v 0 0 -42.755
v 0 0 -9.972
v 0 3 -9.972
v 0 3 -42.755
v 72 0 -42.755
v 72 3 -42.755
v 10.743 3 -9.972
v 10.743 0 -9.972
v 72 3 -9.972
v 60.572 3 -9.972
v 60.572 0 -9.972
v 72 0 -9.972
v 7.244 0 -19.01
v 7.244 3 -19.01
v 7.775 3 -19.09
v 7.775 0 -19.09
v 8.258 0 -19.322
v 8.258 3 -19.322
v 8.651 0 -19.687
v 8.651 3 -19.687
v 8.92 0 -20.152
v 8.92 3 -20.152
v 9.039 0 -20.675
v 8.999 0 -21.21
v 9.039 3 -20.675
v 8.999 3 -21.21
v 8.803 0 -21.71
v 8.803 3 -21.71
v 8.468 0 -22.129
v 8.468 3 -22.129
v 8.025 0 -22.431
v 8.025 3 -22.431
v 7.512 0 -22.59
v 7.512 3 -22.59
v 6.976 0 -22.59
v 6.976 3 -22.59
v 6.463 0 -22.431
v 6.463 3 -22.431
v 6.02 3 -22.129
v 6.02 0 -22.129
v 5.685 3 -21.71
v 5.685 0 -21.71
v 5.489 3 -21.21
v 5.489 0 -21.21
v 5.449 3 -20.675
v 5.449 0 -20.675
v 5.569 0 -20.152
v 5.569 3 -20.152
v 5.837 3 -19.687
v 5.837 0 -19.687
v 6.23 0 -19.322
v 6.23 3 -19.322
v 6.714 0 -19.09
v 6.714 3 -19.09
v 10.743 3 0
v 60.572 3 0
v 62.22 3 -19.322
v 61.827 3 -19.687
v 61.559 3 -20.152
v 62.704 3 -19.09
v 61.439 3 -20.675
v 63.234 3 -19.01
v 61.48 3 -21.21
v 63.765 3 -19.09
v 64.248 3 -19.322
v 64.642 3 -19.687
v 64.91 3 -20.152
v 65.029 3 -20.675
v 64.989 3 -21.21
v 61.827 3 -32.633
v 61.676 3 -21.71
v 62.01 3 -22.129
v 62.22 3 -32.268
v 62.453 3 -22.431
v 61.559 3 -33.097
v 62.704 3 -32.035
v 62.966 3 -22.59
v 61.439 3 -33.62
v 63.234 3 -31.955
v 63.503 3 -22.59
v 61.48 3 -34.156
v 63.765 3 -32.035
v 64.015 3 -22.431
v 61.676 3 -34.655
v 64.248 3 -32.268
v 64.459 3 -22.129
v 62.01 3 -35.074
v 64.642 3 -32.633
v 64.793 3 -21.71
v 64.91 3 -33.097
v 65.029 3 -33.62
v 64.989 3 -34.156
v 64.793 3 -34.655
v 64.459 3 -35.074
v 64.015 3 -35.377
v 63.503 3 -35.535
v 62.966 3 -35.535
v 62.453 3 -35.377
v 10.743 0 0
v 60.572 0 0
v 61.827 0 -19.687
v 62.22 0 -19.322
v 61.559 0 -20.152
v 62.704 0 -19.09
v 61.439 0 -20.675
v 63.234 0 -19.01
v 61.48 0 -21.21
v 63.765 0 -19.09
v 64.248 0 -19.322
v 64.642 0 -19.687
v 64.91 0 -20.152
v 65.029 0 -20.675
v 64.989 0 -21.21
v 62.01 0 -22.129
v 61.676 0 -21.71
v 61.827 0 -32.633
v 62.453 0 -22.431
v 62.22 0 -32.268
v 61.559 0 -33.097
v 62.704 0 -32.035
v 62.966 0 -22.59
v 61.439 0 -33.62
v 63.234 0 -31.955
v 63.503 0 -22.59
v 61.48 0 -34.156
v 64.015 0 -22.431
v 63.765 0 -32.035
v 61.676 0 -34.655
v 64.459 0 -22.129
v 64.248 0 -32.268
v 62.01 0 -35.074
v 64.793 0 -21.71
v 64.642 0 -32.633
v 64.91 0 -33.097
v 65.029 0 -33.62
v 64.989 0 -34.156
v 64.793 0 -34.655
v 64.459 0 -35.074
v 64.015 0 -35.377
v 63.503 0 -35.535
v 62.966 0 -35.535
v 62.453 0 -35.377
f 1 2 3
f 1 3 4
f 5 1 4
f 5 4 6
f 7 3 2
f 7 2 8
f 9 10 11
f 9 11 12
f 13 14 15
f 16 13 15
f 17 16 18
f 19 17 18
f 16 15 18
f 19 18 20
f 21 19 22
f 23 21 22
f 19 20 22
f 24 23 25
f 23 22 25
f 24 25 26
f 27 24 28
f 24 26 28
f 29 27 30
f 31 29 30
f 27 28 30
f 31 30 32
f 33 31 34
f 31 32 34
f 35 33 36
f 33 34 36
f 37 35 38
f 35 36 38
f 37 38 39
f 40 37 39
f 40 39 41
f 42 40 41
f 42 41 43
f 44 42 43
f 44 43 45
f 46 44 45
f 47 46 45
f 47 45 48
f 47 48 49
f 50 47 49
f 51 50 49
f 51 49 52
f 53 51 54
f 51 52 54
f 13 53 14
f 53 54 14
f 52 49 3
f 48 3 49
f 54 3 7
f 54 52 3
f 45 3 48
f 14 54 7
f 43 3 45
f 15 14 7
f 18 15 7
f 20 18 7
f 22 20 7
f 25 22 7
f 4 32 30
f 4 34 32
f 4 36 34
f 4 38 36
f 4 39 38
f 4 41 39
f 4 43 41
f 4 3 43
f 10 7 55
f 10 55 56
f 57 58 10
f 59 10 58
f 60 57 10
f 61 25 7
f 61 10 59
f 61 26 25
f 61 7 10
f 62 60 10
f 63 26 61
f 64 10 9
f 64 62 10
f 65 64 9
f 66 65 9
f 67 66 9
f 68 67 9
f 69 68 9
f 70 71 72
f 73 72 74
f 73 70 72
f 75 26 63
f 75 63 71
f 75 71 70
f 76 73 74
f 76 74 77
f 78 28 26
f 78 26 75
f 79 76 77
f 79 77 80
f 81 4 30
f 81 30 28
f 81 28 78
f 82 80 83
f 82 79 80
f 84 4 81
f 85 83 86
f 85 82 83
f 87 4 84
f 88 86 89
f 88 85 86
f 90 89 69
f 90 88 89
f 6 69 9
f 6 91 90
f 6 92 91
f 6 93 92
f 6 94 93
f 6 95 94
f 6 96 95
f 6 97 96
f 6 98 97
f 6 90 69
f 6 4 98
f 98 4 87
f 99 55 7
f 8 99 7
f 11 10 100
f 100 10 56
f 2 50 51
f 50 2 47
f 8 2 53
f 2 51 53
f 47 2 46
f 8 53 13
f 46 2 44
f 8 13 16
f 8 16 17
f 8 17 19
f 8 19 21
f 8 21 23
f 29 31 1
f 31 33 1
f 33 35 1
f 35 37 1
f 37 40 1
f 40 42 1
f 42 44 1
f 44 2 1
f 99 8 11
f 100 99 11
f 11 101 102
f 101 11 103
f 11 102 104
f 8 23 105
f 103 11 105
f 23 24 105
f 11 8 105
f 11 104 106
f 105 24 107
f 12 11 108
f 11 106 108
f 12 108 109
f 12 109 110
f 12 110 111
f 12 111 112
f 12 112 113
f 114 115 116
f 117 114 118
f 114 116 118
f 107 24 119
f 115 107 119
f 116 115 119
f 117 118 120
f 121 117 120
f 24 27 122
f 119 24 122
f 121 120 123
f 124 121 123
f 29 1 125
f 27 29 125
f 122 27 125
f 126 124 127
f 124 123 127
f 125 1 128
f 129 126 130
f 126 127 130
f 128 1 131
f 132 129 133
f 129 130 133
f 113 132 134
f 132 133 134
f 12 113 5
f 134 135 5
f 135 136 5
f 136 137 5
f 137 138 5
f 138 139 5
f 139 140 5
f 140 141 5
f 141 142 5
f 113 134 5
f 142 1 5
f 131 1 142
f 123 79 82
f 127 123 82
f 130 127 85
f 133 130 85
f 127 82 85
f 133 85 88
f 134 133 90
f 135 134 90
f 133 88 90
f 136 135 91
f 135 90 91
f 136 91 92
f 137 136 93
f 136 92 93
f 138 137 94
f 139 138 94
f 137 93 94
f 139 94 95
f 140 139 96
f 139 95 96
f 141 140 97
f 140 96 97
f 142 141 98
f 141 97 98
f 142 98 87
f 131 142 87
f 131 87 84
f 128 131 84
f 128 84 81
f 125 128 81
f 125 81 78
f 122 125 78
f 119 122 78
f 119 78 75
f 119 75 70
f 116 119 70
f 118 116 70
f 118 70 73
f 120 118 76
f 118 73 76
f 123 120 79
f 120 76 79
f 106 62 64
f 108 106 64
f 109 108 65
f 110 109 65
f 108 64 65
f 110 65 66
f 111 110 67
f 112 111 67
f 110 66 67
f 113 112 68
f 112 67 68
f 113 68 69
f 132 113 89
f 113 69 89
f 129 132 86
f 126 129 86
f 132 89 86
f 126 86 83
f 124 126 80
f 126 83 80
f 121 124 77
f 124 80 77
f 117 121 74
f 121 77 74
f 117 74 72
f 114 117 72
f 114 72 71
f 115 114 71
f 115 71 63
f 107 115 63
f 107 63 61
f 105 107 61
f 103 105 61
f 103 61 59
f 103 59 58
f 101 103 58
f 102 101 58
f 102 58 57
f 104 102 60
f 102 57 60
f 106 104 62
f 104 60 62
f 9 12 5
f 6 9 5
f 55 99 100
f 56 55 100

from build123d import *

# Parameters (mm, degrees)
SKETCH1_W           = 72
SKETCH1_H           = 42.7549792
BOSS_EXTRUDE1_DEPTH = 3
SKETCH2_R           = 1.8
CUT_EXTRUDE1_DEPTH  = 3
SKETCH3_W           = 10.743475017
SKETCH3_H           = 9.971995481
SKETCH3_W_2         = 11.428139851
SKETCH3_H_2         = 7.796989135
SKETCH3_H_3         = 2.175006346
CUT_EXTRUDE2_DEPTH  = 53


with BuildPart() as part:
    # Sketch1 → Boss-Extrude1 (new body)
    with BuildSketch(Plane(origin=(0, 0, 0), x_dir=(1, 0, 0), z_dir=(0, 1, 0))):
        with Locations((36, 21.3774896)):
            Rectangle(SKETCH1_W, SKETCH1_H)
    extrude(amount=BOSS_EXTRUDE1_DEPTH)

    # Sketch2 → Cut-Extrude1 (cut)
    with BuildSketch(Plane(origin=(0, 3, 0), x_dir=(1, 0, 0), z_dir=(0, 1, 0))):
        with Locations(Location((7.244076977, 20.809705714, 0), (0, 0, 270))):
            Circle(SKETCH2_R)
        with Locations(Location((63.234445615, 20.809705714, 0), (0, 0, 270))):
            Circle(SKETCH2_R)
        with Locations(Location((63.234445615, 33.7549792, 0), (0, 0, 270))):
            Circle(SKETCH2_R)
    extrude(amount=-CUT_EXTRUDE1_DEPTH, mode=Mode.SUBTRACT)

    # Sketch3 → Cut-Extrude2 (cut)
    with BuildSketch(Plane(origin=(0, 3, 0), x_dir=(1, 0, 0), z_dir=(0, 1, 0))):
        with Locations((5.371737509, 4.985997741)):
            Rectangle(SKETCH3_W, SKETCH3_H)
        with Locations((66.285930075, 6.073500914)):
            Rectangle(SKETCH3_W_2, SKETCH3_H_2)
        with Locations((66.285930075, 1.087503173)):
            Rectangle(SKETCH3_W_2, SKETCH3_H_3)
    extrude(amount=-CUT_EXTRUDE2_DEPTH, mode=Mode.SUBTRACT)


solid = part.part
